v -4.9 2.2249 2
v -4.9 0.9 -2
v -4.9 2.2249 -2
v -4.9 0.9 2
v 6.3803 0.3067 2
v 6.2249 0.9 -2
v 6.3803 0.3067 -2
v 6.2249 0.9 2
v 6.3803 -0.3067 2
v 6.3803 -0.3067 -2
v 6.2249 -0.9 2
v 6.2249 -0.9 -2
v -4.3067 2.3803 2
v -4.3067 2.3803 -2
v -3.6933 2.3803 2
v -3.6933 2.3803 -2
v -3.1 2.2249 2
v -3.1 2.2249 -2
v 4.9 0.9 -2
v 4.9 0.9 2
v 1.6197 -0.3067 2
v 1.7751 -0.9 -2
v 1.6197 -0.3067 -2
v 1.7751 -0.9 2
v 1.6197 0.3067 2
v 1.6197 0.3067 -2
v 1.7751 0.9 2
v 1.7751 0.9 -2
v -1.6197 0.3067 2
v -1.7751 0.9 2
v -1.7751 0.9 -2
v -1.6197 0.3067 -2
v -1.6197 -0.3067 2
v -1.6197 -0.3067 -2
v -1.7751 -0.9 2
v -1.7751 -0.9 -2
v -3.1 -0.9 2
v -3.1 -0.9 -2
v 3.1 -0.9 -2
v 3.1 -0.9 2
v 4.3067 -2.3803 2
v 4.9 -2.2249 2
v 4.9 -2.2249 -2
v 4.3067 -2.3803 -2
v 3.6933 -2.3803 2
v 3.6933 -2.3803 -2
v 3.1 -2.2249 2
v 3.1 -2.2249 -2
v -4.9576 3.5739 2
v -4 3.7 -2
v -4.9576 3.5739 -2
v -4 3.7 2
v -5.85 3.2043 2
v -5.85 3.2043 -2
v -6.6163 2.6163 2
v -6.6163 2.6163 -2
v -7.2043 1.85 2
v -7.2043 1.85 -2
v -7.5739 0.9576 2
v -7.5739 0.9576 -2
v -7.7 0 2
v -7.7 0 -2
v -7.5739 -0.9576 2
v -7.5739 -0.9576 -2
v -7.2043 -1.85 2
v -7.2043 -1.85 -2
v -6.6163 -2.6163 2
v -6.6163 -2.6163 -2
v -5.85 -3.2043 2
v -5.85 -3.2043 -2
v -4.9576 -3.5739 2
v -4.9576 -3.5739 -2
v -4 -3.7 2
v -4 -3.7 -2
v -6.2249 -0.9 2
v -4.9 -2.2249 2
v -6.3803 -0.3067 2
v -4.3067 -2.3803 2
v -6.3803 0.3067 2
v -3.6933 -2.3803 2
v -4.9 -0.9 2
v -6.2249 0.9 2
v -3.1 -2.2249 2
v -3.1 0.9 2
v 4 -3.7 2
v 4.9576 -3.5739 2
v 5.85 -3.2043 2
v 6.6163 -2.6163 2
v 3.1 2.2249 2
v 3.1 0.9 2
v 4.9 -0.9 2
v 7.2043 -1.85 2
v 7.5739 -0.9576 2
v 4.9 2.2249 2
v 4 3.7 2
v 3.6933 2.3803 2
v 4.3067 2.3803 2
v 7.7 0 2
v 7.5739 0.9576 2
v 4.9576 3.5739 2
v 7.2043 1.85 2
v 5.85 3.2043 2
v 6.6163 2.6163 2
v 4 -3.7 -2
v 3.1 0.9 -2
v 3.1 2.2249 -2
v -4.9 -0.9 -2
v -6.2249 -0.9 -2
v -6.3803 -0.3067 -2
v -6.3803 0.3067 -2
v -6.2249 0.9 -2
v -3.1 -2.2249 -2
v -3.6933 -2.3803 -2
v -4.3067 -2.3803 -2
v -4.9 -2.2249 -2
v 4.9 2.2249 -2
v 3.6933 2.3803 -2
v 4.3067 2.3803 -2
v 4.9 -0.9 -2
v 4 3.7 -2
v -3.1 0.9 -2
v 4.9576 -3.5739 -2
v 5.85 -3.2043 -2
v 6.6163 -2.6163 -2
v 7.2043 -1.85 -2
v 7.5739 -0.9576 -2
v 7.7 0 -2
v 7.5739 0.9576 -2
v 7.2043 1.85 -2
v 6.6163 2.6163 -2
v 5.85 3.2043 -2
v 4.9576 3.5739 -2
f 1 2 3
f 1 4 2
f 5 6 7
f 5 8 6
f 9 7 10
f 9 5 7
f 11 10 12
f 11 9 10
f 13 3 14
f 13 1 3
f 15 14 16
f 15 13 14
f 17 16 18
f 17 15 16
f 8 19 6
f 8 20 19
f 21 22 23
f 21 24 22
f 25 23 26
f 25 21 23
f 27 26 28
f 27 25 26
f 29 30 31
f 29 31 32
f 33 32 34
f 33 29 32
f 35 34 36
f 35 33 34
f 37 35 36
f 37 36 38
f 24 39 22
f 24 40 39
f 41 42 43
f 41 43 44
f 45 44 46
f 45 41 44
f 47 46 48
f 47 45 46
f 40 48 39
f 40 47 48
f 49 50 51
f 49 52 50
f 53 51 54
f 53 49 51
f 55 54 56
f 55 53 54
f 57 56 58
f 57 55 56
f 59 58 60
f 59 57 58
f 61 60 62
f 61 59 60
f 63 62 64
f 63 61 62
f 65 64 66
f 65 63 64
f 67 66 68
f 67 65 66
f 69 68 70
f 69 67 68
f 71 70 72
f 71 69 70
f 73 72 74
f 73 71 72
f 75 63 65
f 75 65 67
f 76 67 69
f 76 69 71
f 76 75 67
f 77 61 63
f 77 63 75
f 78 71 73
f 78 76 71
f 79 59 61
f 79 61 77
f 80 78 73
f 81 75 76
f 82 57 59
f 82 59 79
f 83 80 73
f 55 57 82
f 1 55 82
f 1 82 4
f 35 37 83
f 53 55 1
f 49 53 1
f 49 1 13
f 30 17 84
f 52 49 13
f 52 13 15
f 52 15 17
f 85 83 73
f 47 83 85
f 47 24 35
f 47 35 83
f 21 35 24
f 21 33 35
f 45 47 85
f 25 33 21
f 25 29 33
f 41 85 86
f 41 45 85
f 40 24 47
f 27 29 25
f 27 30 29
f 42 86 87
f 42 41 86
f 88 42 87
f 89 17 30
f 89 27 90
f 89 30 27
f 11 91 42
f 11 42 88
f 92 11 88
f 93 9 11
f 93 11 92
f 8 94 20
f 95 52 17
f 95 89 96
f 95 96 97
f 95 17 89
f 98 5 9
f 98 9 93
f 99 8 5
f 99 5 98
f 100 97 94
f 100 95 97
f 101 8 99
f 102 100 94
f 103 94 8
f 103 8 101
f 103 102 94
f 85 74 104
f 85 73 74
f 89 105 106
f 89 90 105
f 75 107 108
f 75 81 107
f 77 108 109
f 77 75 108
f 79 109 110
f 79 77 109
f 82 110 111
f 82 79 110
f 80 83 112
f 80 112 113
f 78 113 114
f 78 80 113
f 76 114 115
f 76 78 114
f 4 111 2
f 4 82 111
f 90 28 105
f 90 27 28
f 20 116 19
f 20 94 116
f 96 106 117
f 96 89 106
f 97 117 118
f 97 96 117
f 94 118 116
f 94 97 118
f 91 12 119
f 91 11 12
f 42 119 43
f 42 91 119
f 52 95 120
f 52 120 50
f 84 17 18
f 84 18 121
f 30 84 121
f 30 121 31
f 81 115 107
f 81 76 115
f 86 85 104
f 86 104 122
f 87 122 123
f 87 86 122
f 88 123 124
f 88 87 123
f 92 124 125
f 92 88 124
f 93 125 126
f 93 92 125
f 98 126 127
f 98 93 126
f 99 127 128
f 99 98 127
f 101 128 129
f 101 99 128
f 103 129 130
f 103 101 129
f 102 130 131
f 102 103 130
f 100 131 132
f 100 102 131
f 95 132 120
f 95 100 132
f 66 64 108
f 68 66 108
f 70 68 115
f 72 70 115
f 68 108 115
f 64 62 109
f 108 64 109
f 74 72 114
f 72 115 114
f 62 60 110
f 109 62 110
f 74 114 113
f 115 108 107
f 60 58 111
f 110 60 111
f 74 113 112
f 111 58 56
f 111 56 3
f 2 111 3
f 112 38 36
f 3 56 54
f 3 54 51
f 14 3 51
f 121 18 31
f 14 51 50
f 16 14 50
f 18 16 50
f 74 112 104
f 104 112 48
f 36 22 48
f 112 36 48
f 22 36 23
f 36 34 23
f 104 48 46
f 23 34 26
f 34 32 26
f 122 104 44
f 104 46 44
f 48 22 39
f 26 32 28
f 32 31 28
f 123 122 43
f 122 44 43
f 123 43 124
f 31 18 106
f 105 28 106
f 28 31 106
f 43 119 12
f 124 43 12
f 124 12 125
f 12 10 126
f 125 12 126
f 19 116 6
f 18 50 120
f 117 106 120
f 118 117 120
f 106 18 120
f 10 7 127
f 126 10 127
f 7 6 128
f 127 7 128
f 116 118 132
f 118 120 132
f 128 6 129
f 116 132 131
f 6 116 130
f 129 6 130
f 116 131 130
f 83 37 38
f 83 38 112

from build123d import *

# Parameters (mm, degrees)
BOSS_EXTRUDE1_DEPTH = 2


with BuildPart() as part:
    # Sketch1 → Boss-Extrude1 (new, symmetric)
    with BuildSketch(Plane.XY):
        with BuildLine():
            Line((-4, -3.7), (4, -3.7))
            ThreePointArc((4, -3.7), (7.7, 0), (4, 3.7))
            Line((4, 3.7), (-4, 3.7))
            ThreePointArc((-4, 3.7), (-7.7, 0), (-4, -3.7))
        make_face()
        with BuildLine():
            Line((-3.1, 2.224859546), (-3.1, 0.9))
            Line((-3.1, 0.9), (-1.775140454, 0.9))
            ThreePointArc((-1.775140454, 0.9), (-1.6, 0), (-1.775140454, -0.9))
            Line((-1.775140454, -0.9), (-3.1, -0.9))
            Line((-3.1, -0.9), (-3.1, -2.224859546))
            ThreePointArc((-3.1, -2.224859546), (-4, -2.4), (-4.9, -2.224859546))
            Line((-4.9, -2.224859546), (-4.9, -0.9))
            Line((-4.9, -0.9), (-6.224859546, -0.9))
            ThreePointArc((-6.224859546, -0.9), (-6.4, 0), (-6.224859546, 0.9))
            Line((-6.224859546, 0.9), (-4.9, 0.9))
            Line((-4.9, 0.9), (-4.9, 2.224859546))
            ThreePointArc((-4.9, 2.224859546), (-4, 2.4), (-3.1, 2.224859546))
        make_face(mode=Mode.SUBTRACT)
        with BuildLine():
            ThreePointArc((4.9, -2.224859546), (4, -2.4), (3.1, -2.224859546))
            Line((3.1, -2.224859546), (3.1, -0.9))
            Line((3.1, -0.9), (1.775140454, -0.9))
            ThreePointArc((1.775140454, -0.9), (1.6, 0), (1.775140454, 0.9))
            Line((1.775140454, 0.9), (3.1, 0.9))
            Line((3.1, 0.9), (3.1, 2.224859546))
            ThreePointArc((3.1, 2.224859546), (4, 2.4), (4.9, 2.224859546))
            Line((4.9, 2.224859546), (4.9, 0.9))
            Line((4.9, 0.9), (6.224859546, 0.9))
            ThreePointArc((6.224859546, 0.9), (6.4, 0), (6.224859546, -0.9))
            Line((6.224859546, -0.9), (4.9, -0.9))
            Line((4.9, -0.9), (4.9, -2.224859546))
        make_face(mode=Mode.SUBTRACT)
    extrude(amount=BOSS_EXTRUDE1_DEPTH, both=True)


solid = part.part
